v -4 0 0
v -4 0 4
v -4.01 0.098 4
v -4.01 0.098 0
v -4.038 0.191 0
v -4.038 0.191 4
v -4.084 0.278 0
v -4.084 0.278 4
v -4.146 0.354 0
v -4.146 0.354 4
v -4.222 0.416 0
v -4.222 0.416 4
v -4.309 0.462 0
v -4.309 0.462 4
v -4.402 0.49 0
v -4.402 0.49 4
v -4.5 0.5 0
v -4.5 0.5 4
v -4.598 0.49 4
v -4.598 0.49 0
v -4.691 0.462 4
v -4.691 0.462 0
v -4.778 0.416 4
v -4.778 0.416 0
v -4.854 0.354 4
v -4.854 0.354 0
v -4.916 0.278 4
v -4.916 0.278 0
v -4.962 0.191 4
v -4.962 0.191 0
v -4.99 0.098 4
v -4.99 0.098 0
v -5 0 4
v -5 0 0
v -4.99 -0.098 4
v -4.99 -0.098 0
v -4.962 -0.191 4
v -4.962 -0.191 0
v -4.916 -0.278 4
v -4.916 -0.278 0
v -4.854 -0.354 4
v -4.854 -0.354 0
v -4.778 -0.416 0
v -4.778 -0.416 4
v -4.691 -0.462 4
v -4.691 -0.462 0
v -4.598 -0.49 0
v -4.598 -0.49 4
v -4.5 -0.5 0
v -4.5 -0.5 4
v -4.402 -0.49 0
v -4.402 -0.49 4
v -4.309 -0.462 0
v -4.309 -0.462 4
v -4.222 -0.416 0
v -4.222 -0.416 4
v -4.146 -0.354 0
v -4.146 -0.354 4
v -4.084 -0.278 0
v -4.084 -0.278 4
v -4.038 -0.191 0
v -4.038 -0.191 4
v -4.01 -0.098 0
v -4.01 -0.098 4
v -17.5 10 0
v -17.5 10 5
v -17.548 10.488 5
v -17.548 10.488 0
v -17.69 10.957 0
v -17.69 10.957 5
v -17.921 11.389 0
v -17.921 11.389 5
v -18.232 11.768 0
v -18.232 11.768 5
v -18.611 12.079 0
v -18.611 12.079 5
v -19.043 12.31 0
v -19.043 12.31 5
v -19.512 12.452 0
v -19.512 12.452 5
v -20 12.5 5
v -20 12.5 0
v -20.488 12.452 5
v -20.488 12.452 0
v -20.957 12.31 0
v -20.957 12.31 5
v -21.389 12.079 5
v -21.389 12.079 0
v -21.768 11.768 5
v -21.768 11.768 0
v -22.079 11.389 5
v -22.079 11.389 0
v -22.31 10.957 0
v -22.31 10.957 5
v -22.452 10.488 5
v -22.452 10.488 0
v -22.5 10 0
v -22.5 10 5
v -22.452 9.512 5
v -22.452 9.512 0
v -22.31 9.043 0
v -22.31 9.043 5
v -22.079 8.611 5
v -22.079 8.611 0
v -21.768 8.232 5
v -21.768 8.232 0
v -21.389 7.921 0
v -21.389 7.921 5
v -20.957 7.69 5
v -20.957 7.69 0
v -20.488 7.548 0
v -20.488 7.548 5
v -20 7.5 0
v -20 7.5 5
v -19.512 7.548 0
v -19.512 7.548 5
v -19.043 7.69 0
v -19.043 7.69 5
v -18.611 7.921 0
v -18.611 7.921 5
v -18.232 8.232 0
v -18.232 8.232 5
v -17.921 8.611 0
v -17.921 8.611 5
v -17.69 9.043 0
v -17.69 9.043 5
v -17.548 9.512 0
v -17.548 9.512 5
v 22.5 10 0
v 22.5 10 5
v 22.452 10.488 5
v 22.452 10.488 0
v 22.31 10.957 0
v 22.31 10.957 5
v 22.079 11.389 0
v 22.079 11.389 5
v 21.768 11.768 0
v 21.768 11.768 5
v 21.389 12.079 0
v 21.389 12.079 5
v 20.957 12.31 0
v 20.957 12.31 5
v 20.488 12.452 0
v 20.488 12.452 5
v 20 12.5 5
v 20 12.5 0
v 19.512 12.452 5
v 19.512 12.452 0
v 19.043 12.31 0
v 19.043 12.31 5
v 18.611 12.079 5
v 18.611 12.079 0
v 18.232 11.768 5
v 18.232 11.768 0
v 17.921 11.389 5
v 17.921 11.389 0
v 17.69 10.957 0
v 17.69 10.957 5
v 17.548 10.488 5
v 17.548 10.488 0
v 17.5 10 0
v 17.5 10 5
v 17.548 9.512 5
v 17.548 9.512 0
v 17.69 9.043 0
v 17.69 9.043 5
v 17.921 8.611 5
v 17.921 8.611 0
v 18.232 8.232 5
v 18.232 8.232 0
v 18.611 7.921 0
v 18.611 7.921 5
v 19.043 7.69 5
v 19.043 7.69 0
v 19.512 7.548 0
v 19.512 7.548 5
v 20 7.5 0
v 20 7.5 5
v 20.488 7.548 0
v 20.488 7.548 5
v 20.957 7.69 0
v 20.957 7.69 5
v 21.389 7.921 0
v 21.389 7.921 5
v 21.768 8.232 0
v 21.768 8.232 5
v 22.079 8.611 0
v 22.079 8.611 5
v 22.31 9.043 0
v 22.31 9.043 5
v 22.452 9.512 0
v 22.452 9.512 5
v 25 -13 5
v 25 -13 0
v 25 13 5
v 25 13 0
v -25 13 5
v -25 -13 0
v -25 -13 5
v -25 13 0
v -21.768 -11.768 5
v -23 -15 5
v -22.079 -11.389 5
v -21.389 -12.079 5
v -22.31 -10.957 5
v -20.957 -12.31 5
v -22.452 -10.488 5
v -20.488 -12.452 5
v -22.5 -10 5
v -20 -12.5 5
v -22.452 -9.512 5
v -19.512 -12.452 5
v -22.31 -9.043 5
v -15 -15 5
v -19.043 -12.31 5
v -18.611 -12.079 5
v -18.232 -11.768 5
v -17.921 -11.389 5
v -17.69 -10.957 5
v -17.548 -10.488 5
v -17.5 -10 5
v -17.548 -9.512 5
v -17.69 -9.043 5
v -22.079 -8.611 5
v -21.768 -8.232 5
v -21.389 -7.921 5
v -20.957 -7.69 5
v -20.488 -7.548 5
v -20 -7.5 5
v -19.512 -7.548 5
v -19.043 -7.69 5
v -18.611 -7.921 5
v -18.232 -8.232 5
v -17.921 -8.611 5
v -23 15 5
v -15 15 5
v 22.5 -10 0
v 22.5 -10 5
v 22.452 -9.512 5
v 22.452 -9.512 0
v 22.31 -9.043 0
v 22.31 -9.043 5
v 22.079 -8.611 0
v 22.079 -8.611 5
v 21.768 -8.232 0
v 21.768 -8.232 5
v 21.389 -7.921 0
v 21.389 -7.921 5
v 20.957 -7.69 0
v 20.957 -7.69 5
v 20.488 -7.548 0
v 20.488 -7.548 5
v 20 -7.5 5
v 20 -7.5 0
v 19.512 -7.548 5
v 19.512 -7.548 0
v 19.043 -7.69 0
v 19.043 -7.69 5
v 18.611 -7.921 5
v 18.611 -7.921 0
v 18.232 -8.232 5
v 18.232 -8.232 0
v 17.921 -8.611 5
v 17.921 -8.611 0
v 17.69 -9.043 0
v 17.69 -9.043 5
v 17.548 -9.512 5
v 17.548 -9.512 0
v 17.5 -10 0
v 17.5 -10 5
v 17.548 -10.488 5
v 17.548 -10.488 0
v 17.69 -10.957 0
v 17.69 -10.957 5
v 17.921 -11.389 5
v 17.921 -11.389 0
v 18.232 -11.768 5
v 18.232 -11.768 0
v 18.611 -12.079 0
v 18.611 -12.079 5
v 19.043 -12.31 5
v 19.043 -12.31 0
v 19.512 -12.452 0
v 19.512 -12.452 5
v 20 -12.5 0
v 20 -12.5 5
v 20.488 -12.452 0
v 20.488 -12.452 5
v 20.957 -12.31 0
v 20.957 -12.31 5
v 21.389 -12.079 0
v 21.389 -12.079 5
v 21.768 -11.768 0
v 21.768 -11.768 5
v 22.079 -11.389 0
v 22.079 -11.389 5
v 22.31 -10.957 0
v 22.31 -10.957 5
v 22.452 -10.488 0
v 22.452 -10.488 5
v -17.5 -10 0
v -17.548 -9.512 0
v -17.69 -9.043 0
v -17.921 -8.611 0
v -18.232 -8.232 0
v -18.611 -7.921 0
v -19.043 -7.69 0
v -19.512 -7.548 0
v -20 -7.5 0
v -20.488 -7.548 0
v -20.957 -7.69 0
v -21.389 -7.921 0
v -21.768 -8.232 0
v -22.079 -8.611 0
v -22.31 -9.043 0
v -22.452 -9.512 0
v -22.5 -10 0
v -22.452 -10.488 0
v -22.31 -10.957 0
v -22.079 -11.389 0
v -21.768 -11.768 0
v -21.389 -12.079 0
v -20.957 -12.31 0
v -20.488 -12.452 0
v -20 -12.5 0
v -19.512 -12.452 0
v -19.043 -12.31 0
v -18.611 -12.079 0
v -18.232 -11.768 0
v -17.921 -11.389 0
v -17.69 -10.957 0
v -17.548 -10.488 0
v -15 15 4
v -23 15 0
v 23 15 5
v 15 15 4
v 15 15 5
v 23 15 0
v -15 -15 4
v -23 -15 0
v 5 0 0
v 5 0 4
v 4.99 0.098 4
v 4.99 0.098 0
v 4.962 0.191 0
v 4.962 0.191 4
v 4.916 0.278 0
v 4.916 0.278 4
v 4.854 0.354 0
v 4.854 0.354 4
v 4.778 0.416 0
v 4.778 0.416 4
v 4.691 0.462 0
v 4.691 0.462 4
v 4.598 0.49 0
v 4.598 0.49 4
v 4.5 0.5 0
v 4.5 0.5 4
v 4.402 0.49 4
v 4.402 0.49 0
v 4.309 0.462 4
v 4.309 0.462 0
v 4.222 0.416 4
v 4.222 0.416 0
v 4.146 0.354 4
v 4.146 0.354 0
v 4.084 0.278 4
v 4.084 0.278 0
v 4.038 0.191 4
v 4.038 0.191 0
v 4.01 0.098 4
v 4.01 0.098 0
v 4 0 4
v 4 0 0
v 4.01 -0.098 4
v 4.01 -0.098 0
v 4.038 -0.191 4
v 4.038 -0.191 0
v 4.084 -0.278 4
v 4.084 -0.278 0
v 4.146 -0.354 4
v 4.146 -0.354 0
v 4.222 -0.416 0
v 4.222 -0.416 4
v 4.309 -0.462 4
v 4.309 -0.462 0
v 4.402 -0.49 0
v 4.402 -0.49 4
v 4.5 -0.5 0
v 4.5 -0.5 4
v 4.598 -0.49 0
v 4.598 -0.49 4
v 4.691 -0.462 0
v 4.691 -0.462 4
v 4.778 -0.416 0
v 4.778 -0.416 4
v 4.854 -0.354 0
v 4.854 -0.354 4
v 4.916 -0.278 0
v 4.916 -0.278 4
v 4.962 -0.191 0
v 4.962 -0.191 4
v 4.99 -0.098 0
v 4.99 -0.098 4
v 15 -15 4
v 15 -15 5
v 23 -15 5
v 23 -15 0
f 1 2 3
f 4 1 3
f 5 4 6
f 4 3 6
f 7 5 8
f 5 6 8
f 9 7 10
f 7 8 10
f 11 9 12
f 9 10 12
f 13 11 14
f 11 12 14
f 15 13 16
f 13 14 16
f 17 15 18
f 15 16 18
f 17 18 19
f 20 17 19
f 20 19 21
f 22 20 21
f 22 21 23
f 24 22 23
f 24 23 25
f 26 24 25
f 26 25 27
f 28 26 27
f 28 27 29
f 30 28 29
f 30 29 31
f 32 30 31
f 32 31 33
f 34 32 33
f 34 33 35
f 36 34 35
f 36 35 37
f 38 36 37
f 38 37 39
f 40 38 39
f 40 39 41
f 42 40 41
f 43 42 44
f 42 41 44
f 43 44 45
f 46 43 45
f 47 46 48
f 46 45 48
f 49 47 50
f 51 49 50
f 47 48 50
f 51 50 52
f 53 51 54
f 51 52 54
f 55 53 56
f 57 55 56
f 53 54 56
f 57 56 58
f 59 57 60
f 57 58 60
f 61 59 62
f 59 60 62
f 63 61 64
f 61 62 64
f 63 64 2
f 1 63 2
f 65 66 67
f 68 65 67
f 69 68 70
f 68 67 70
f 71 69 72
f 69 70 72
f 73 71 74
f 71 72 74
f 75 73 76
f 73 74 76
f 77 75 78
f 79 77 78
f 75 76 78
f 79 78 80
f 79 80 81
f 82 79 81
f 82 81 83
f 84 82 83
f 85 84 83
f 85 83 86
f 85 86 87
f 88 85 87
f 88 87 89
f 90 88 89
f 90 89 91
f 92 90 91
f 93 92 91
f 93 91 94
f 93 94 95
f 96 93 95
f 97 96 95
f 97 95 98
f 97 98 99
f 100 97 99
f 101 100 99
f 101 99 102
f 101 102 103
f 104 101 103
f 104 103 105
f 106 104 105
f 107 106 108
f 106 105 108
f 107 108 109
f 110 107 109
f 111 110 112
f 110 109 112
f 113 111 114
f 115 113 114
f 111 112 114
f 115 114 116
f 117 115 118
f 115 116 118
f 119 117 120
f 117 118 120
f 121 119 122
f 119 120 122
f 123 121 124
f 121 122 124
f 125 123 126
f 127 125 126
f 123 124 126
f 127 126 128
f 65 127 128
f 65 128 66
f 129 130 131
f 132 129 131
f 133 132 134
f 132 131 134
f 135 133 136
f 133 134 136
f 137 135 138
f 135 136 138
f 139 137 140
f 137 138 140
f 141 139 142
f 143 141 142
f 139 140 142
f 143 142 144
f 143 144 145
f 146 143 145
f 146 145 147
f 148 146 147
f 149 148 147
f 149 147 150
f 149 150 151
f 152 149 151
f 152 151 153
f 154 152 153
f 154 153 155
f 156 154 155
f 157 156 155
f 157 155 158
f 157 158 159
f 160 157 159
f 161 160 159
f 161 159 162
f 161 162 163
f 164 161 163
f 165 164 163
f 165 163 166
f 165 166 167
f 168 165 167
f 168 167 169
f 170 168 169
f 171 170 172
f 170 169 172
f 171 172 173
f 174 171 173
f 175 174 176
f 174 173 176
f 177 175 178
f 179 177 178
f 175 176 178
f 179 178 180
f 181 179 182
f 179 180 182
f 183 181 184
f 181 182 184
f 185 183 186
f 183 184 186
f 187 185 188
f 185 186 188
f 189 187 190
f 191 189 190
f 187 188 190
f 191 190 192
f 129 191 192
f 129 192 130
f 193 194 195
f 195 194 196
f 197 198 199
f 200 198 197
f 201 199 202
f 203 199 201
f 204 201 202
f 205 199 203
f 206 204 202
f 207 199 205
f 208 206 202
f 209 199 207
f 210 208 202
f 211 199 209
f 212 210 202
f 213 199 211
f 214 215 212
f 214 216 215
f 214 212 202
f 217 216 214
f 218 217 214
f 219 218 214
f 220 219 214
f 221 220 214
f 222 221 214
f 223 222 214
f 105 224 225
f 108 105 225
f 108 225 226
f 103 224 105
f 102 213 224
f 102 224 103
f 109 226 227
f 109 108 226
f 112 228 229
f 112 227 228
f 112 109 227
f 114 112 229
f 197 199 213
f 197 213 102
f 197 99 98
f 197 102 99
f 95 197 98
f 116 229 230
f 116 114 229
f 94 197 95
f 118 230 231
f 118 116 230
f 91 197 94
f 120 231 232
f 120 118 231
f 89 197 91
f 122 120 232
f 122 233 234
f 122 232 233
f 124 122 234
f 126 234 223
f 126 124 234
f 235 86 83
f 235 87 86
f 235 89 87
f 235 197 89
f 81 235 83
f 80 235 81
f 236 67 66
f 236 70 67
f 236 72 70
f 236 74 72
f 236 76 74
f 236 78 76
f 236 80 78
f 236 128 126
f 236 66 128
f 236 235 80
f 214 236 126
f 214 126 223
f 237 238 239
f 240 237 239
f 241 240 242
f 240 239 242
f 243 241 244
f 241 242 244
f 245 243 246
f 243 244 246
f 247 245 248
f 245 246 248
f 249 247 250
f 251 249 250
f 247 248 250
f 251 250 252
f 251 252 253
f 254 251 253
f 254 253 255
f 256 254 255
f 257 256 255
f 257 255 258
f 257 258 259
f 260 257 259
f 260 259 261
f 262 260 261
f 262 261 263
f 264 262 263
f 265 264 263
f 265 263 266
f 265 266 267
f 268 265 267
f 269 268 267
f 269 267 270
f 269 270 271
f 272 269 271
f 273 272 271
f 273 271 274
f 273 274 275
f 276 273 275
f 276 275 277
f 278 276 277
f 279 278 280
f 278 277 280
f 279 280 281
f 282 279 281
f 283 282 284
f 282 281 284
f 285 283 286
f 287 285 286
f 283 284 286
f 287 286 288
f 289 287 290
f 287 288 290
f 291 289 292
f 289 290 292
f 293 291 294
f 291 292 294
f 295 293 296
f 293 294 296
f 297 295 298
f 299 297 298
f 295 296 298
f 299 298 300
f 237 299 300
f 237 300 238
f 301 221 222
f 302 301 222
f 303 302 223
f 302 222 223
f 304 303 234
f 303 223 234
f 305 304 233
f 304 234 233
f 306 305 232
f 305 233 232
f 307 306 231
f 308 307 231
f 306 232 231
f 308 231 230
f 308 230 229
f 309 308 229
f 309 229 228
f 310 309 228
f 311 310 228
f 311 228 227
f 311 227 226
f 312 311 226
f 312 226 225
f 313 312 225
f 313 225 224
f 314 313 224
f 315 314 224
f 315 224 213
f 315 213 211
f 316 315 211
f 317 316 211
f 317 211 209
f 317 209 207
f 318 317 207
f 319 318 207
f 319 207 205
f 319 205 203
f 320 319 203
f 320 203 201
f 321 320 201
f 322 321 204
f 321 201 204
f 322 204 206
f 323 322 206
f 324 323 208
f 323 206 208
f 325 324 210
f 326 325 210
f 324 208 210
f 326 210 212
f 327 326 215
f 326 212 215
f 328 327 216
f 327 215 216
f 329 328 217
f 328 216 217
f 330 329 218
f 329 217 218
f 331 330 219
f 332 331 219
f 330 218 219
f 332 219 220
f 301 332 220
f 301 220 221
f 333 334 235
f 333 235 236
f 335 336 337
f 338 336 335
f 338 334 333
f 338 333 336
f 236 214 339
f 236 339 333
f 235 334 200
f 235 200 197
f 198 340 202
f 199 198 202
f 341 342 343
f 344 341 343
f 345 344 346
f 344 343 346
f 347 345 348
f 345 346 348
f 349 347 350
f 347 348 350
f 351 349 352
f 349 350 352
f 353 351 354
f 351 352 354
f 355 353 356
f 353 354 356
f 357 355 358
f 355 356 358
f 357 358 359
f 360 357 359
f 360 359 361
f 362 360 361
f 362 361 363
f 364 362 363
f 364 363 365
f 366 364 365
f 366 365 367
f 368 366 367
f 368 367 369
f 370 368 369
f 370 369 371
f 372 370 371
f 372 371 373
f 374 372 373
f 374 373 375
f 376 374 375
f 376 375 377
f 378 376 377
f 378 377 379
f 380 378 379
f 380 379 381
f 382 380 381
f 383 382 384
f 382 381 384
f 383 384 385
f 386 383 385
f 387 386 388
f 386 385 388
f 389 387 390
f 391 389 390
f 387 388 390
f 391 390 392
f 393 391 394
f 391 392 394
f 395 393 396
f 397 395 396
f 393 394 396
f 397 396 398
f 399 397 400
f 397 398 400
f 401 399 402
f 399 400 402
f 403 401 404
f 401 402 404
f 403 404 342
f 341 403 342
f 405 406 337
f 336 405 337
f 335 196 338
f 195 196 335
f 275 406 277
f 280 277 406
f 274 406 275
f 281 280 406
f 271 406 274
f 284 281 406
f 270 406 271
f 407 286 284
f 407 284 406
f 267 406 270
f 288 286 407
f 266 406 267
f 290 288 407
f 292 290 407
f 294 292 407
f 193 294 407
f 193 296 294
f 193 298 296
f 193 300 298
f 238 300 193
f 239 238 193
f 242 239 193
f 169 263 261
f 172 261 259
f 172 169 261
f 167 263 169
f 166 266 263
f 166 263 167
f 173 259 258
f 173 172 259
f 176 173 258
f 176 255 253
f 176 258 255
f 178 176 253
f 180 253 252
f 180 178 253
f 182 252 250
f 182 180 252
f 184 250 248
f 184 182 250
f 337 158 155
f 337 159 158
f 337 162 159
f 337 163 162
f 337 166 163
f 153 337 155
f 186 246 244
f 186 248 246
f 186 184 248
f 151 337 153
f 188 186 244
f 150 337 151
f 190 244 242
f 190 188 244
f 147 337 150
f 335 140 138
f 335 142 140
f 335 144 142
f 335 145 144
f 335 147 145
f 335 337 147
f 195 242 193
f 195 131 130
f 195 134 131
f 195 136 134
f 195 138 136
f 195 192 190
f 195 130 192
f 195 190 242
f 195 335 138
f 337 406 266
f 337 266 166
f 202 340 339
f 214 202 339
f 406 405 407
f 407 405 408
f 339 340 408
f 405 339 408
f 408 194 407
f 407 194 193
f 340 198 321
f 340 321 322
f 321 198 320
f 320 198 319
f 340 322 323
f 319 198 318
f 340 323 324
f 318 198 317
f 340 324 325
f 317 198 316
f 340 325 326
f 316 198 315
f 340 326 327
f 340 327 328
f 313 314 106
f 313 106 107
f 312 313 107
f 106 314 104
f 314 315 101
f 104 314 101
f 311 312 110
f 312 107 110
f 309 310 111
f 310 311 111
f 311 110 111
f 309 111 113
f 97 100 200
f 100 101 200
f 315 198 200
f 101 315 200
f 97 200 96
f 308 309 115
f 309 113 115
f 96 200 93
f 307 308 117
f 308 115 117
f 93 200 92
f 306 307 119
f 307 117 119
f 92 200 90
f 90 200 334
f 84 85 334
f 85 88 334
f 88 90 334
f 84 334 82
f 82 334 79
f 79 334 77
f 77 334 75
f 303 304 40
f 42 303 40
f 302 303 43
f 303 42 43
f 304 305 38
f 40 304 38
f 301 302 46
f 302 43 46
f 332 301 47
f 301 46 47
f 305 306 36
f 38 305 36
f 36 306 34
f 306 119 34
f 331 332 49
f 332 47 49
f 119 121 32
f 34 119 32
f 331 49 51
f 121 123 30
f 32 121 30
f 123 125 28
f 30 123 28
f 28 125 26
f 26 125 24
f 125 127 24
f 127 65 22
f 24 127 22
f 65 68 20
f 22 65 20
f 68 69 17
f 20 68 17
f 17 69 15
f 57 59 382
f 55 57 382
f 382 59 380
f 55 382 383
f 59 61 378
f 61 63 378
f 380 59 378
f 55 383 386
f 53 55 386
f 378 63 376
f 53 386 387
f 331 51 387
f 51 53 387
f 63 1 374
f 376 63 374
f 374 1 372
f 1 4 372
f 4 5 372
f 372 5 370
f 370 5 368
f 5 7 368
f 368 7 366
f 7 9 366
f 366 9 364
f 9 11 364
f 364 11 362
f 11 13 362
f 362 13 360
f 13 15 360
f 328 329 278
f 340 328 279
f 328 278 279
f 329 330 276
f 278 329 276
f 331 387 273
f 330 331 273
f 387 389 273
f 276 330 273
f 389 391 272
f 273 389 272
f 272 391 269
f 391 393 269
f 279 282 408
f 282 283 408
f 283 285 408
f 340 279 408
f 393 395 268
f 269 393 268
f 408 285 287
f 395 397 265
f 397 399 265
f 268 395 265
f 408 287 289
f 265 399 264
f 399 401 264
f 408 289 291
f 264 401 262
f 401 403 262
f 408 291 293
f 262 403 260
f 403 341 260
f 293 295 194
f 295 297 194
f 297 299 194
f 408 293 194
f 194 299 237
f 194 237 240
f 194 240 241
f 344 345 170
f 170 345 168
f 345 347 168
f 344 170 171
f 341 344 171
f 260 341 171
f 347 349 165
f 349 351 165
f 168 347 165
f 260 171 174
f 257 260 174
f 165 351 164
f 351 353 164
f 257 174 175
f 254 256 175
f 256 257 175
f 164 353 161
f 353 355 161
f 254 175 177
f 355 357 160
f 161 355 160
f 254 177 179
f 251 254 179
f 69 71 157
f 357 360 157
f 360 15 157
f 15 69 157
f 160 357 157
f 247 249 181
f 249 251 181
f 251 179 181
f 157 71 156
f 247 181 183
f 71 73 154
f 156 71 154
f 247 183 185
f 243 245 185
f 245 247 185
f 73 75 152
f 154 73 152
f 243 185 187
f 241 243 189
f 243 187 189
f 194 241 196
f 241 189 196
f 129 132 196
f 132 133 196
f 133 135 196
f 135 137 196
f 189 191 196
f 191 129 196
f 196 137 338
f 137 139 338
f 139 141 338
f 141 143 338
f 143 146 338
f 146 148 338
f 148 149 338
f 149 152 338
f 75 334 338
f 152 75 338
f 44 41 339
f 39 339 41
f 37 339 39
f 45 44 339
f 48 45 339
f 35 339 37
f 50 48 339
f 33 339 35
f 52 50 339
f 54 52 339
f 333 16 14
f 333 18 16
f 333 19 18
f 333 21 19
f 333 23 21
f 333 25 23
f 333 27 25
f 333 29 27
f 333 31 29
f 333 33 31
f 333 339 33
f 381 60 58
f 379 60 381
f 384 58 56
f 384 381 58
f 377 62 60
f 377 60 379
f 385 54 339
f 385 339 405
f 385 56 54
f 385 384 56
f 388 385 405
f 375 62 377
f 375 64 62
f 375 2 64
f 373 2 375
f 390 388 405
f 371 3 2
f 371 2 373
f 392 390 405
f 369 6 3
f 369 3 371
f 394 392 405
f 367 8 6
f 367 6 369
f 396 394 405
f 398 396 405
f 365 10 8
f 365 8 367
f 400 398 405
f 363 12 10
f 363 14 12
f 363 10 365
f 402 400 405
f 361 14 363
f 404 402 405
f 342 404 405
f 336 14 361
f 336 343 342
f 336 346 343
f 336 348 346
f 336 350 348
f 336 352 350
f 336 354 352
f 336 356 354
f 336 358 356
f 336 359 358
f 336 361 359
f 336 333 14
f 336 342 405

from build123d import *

# Parameters (mm, degrees)
F0_W     = 50
F0_H     = 30
F1_DEPTH = 5
F2_W     = 30
F2_H     = 30
F3_DEPTH = 1
F4_SIZE  = 2
F5_R     = 2.5
F6_DEPTH = 25
F7_R     = 0.5
F8_DEPTH = 25


with BuildPart() as f1:
    # F0 (on Top) → F1 (new body)
    with BuildSketch(Plane.XY):
        Rectangle(F0_W, F0_H)
    extrude(amount=F1_DEPTH)

    # F2 (on face) → F3 (cut)
    with BuildSketch(Plane.XY.offset(5)):
        Rectangle(F2_W, F2_H)
    extrude(amount=-F3_DEPTH, mode=Mode.SUBTRACT)

    # F4
    f4_edges = [f1.edges().sort_by_distance(p)[0] for p in [
        (-25, 15, 2.5),
        (-25, -15, 2.5),
        (25, -15, 2.5),
        (25, 15, 2.5),
    ]]
    chamfer(f4_edges, length=F4_SIZE)

    # F5 (on face) → F6 (cut)
    with BuildSketch(Plane.XY.offset(5)):
        with Locations((-20, 10)):
            Circle(F5_R)
        with Locations((-20, -10)):
            Circle(F5_R)
        with Locations((20, -10)):
            Circle(F5_R)
        with Locations((20, 10)):
            Circle(F5_R)
    extrude(amount=-F6_DEPTH, mode=Mode.SUBTRACT)

    # F7 (on face) → F8 (cut)
    with BuildSketch(Plane.XY.offset(4)):
        with Locations((-4.5, 0)):
            Circle(F7_R)
        with Locations((4.5, 0)):
            Circle(F7_R)
    extrude(amount=-F8_DEPTH, mode=Mode.SUBTRACT)


solid = f1.part
